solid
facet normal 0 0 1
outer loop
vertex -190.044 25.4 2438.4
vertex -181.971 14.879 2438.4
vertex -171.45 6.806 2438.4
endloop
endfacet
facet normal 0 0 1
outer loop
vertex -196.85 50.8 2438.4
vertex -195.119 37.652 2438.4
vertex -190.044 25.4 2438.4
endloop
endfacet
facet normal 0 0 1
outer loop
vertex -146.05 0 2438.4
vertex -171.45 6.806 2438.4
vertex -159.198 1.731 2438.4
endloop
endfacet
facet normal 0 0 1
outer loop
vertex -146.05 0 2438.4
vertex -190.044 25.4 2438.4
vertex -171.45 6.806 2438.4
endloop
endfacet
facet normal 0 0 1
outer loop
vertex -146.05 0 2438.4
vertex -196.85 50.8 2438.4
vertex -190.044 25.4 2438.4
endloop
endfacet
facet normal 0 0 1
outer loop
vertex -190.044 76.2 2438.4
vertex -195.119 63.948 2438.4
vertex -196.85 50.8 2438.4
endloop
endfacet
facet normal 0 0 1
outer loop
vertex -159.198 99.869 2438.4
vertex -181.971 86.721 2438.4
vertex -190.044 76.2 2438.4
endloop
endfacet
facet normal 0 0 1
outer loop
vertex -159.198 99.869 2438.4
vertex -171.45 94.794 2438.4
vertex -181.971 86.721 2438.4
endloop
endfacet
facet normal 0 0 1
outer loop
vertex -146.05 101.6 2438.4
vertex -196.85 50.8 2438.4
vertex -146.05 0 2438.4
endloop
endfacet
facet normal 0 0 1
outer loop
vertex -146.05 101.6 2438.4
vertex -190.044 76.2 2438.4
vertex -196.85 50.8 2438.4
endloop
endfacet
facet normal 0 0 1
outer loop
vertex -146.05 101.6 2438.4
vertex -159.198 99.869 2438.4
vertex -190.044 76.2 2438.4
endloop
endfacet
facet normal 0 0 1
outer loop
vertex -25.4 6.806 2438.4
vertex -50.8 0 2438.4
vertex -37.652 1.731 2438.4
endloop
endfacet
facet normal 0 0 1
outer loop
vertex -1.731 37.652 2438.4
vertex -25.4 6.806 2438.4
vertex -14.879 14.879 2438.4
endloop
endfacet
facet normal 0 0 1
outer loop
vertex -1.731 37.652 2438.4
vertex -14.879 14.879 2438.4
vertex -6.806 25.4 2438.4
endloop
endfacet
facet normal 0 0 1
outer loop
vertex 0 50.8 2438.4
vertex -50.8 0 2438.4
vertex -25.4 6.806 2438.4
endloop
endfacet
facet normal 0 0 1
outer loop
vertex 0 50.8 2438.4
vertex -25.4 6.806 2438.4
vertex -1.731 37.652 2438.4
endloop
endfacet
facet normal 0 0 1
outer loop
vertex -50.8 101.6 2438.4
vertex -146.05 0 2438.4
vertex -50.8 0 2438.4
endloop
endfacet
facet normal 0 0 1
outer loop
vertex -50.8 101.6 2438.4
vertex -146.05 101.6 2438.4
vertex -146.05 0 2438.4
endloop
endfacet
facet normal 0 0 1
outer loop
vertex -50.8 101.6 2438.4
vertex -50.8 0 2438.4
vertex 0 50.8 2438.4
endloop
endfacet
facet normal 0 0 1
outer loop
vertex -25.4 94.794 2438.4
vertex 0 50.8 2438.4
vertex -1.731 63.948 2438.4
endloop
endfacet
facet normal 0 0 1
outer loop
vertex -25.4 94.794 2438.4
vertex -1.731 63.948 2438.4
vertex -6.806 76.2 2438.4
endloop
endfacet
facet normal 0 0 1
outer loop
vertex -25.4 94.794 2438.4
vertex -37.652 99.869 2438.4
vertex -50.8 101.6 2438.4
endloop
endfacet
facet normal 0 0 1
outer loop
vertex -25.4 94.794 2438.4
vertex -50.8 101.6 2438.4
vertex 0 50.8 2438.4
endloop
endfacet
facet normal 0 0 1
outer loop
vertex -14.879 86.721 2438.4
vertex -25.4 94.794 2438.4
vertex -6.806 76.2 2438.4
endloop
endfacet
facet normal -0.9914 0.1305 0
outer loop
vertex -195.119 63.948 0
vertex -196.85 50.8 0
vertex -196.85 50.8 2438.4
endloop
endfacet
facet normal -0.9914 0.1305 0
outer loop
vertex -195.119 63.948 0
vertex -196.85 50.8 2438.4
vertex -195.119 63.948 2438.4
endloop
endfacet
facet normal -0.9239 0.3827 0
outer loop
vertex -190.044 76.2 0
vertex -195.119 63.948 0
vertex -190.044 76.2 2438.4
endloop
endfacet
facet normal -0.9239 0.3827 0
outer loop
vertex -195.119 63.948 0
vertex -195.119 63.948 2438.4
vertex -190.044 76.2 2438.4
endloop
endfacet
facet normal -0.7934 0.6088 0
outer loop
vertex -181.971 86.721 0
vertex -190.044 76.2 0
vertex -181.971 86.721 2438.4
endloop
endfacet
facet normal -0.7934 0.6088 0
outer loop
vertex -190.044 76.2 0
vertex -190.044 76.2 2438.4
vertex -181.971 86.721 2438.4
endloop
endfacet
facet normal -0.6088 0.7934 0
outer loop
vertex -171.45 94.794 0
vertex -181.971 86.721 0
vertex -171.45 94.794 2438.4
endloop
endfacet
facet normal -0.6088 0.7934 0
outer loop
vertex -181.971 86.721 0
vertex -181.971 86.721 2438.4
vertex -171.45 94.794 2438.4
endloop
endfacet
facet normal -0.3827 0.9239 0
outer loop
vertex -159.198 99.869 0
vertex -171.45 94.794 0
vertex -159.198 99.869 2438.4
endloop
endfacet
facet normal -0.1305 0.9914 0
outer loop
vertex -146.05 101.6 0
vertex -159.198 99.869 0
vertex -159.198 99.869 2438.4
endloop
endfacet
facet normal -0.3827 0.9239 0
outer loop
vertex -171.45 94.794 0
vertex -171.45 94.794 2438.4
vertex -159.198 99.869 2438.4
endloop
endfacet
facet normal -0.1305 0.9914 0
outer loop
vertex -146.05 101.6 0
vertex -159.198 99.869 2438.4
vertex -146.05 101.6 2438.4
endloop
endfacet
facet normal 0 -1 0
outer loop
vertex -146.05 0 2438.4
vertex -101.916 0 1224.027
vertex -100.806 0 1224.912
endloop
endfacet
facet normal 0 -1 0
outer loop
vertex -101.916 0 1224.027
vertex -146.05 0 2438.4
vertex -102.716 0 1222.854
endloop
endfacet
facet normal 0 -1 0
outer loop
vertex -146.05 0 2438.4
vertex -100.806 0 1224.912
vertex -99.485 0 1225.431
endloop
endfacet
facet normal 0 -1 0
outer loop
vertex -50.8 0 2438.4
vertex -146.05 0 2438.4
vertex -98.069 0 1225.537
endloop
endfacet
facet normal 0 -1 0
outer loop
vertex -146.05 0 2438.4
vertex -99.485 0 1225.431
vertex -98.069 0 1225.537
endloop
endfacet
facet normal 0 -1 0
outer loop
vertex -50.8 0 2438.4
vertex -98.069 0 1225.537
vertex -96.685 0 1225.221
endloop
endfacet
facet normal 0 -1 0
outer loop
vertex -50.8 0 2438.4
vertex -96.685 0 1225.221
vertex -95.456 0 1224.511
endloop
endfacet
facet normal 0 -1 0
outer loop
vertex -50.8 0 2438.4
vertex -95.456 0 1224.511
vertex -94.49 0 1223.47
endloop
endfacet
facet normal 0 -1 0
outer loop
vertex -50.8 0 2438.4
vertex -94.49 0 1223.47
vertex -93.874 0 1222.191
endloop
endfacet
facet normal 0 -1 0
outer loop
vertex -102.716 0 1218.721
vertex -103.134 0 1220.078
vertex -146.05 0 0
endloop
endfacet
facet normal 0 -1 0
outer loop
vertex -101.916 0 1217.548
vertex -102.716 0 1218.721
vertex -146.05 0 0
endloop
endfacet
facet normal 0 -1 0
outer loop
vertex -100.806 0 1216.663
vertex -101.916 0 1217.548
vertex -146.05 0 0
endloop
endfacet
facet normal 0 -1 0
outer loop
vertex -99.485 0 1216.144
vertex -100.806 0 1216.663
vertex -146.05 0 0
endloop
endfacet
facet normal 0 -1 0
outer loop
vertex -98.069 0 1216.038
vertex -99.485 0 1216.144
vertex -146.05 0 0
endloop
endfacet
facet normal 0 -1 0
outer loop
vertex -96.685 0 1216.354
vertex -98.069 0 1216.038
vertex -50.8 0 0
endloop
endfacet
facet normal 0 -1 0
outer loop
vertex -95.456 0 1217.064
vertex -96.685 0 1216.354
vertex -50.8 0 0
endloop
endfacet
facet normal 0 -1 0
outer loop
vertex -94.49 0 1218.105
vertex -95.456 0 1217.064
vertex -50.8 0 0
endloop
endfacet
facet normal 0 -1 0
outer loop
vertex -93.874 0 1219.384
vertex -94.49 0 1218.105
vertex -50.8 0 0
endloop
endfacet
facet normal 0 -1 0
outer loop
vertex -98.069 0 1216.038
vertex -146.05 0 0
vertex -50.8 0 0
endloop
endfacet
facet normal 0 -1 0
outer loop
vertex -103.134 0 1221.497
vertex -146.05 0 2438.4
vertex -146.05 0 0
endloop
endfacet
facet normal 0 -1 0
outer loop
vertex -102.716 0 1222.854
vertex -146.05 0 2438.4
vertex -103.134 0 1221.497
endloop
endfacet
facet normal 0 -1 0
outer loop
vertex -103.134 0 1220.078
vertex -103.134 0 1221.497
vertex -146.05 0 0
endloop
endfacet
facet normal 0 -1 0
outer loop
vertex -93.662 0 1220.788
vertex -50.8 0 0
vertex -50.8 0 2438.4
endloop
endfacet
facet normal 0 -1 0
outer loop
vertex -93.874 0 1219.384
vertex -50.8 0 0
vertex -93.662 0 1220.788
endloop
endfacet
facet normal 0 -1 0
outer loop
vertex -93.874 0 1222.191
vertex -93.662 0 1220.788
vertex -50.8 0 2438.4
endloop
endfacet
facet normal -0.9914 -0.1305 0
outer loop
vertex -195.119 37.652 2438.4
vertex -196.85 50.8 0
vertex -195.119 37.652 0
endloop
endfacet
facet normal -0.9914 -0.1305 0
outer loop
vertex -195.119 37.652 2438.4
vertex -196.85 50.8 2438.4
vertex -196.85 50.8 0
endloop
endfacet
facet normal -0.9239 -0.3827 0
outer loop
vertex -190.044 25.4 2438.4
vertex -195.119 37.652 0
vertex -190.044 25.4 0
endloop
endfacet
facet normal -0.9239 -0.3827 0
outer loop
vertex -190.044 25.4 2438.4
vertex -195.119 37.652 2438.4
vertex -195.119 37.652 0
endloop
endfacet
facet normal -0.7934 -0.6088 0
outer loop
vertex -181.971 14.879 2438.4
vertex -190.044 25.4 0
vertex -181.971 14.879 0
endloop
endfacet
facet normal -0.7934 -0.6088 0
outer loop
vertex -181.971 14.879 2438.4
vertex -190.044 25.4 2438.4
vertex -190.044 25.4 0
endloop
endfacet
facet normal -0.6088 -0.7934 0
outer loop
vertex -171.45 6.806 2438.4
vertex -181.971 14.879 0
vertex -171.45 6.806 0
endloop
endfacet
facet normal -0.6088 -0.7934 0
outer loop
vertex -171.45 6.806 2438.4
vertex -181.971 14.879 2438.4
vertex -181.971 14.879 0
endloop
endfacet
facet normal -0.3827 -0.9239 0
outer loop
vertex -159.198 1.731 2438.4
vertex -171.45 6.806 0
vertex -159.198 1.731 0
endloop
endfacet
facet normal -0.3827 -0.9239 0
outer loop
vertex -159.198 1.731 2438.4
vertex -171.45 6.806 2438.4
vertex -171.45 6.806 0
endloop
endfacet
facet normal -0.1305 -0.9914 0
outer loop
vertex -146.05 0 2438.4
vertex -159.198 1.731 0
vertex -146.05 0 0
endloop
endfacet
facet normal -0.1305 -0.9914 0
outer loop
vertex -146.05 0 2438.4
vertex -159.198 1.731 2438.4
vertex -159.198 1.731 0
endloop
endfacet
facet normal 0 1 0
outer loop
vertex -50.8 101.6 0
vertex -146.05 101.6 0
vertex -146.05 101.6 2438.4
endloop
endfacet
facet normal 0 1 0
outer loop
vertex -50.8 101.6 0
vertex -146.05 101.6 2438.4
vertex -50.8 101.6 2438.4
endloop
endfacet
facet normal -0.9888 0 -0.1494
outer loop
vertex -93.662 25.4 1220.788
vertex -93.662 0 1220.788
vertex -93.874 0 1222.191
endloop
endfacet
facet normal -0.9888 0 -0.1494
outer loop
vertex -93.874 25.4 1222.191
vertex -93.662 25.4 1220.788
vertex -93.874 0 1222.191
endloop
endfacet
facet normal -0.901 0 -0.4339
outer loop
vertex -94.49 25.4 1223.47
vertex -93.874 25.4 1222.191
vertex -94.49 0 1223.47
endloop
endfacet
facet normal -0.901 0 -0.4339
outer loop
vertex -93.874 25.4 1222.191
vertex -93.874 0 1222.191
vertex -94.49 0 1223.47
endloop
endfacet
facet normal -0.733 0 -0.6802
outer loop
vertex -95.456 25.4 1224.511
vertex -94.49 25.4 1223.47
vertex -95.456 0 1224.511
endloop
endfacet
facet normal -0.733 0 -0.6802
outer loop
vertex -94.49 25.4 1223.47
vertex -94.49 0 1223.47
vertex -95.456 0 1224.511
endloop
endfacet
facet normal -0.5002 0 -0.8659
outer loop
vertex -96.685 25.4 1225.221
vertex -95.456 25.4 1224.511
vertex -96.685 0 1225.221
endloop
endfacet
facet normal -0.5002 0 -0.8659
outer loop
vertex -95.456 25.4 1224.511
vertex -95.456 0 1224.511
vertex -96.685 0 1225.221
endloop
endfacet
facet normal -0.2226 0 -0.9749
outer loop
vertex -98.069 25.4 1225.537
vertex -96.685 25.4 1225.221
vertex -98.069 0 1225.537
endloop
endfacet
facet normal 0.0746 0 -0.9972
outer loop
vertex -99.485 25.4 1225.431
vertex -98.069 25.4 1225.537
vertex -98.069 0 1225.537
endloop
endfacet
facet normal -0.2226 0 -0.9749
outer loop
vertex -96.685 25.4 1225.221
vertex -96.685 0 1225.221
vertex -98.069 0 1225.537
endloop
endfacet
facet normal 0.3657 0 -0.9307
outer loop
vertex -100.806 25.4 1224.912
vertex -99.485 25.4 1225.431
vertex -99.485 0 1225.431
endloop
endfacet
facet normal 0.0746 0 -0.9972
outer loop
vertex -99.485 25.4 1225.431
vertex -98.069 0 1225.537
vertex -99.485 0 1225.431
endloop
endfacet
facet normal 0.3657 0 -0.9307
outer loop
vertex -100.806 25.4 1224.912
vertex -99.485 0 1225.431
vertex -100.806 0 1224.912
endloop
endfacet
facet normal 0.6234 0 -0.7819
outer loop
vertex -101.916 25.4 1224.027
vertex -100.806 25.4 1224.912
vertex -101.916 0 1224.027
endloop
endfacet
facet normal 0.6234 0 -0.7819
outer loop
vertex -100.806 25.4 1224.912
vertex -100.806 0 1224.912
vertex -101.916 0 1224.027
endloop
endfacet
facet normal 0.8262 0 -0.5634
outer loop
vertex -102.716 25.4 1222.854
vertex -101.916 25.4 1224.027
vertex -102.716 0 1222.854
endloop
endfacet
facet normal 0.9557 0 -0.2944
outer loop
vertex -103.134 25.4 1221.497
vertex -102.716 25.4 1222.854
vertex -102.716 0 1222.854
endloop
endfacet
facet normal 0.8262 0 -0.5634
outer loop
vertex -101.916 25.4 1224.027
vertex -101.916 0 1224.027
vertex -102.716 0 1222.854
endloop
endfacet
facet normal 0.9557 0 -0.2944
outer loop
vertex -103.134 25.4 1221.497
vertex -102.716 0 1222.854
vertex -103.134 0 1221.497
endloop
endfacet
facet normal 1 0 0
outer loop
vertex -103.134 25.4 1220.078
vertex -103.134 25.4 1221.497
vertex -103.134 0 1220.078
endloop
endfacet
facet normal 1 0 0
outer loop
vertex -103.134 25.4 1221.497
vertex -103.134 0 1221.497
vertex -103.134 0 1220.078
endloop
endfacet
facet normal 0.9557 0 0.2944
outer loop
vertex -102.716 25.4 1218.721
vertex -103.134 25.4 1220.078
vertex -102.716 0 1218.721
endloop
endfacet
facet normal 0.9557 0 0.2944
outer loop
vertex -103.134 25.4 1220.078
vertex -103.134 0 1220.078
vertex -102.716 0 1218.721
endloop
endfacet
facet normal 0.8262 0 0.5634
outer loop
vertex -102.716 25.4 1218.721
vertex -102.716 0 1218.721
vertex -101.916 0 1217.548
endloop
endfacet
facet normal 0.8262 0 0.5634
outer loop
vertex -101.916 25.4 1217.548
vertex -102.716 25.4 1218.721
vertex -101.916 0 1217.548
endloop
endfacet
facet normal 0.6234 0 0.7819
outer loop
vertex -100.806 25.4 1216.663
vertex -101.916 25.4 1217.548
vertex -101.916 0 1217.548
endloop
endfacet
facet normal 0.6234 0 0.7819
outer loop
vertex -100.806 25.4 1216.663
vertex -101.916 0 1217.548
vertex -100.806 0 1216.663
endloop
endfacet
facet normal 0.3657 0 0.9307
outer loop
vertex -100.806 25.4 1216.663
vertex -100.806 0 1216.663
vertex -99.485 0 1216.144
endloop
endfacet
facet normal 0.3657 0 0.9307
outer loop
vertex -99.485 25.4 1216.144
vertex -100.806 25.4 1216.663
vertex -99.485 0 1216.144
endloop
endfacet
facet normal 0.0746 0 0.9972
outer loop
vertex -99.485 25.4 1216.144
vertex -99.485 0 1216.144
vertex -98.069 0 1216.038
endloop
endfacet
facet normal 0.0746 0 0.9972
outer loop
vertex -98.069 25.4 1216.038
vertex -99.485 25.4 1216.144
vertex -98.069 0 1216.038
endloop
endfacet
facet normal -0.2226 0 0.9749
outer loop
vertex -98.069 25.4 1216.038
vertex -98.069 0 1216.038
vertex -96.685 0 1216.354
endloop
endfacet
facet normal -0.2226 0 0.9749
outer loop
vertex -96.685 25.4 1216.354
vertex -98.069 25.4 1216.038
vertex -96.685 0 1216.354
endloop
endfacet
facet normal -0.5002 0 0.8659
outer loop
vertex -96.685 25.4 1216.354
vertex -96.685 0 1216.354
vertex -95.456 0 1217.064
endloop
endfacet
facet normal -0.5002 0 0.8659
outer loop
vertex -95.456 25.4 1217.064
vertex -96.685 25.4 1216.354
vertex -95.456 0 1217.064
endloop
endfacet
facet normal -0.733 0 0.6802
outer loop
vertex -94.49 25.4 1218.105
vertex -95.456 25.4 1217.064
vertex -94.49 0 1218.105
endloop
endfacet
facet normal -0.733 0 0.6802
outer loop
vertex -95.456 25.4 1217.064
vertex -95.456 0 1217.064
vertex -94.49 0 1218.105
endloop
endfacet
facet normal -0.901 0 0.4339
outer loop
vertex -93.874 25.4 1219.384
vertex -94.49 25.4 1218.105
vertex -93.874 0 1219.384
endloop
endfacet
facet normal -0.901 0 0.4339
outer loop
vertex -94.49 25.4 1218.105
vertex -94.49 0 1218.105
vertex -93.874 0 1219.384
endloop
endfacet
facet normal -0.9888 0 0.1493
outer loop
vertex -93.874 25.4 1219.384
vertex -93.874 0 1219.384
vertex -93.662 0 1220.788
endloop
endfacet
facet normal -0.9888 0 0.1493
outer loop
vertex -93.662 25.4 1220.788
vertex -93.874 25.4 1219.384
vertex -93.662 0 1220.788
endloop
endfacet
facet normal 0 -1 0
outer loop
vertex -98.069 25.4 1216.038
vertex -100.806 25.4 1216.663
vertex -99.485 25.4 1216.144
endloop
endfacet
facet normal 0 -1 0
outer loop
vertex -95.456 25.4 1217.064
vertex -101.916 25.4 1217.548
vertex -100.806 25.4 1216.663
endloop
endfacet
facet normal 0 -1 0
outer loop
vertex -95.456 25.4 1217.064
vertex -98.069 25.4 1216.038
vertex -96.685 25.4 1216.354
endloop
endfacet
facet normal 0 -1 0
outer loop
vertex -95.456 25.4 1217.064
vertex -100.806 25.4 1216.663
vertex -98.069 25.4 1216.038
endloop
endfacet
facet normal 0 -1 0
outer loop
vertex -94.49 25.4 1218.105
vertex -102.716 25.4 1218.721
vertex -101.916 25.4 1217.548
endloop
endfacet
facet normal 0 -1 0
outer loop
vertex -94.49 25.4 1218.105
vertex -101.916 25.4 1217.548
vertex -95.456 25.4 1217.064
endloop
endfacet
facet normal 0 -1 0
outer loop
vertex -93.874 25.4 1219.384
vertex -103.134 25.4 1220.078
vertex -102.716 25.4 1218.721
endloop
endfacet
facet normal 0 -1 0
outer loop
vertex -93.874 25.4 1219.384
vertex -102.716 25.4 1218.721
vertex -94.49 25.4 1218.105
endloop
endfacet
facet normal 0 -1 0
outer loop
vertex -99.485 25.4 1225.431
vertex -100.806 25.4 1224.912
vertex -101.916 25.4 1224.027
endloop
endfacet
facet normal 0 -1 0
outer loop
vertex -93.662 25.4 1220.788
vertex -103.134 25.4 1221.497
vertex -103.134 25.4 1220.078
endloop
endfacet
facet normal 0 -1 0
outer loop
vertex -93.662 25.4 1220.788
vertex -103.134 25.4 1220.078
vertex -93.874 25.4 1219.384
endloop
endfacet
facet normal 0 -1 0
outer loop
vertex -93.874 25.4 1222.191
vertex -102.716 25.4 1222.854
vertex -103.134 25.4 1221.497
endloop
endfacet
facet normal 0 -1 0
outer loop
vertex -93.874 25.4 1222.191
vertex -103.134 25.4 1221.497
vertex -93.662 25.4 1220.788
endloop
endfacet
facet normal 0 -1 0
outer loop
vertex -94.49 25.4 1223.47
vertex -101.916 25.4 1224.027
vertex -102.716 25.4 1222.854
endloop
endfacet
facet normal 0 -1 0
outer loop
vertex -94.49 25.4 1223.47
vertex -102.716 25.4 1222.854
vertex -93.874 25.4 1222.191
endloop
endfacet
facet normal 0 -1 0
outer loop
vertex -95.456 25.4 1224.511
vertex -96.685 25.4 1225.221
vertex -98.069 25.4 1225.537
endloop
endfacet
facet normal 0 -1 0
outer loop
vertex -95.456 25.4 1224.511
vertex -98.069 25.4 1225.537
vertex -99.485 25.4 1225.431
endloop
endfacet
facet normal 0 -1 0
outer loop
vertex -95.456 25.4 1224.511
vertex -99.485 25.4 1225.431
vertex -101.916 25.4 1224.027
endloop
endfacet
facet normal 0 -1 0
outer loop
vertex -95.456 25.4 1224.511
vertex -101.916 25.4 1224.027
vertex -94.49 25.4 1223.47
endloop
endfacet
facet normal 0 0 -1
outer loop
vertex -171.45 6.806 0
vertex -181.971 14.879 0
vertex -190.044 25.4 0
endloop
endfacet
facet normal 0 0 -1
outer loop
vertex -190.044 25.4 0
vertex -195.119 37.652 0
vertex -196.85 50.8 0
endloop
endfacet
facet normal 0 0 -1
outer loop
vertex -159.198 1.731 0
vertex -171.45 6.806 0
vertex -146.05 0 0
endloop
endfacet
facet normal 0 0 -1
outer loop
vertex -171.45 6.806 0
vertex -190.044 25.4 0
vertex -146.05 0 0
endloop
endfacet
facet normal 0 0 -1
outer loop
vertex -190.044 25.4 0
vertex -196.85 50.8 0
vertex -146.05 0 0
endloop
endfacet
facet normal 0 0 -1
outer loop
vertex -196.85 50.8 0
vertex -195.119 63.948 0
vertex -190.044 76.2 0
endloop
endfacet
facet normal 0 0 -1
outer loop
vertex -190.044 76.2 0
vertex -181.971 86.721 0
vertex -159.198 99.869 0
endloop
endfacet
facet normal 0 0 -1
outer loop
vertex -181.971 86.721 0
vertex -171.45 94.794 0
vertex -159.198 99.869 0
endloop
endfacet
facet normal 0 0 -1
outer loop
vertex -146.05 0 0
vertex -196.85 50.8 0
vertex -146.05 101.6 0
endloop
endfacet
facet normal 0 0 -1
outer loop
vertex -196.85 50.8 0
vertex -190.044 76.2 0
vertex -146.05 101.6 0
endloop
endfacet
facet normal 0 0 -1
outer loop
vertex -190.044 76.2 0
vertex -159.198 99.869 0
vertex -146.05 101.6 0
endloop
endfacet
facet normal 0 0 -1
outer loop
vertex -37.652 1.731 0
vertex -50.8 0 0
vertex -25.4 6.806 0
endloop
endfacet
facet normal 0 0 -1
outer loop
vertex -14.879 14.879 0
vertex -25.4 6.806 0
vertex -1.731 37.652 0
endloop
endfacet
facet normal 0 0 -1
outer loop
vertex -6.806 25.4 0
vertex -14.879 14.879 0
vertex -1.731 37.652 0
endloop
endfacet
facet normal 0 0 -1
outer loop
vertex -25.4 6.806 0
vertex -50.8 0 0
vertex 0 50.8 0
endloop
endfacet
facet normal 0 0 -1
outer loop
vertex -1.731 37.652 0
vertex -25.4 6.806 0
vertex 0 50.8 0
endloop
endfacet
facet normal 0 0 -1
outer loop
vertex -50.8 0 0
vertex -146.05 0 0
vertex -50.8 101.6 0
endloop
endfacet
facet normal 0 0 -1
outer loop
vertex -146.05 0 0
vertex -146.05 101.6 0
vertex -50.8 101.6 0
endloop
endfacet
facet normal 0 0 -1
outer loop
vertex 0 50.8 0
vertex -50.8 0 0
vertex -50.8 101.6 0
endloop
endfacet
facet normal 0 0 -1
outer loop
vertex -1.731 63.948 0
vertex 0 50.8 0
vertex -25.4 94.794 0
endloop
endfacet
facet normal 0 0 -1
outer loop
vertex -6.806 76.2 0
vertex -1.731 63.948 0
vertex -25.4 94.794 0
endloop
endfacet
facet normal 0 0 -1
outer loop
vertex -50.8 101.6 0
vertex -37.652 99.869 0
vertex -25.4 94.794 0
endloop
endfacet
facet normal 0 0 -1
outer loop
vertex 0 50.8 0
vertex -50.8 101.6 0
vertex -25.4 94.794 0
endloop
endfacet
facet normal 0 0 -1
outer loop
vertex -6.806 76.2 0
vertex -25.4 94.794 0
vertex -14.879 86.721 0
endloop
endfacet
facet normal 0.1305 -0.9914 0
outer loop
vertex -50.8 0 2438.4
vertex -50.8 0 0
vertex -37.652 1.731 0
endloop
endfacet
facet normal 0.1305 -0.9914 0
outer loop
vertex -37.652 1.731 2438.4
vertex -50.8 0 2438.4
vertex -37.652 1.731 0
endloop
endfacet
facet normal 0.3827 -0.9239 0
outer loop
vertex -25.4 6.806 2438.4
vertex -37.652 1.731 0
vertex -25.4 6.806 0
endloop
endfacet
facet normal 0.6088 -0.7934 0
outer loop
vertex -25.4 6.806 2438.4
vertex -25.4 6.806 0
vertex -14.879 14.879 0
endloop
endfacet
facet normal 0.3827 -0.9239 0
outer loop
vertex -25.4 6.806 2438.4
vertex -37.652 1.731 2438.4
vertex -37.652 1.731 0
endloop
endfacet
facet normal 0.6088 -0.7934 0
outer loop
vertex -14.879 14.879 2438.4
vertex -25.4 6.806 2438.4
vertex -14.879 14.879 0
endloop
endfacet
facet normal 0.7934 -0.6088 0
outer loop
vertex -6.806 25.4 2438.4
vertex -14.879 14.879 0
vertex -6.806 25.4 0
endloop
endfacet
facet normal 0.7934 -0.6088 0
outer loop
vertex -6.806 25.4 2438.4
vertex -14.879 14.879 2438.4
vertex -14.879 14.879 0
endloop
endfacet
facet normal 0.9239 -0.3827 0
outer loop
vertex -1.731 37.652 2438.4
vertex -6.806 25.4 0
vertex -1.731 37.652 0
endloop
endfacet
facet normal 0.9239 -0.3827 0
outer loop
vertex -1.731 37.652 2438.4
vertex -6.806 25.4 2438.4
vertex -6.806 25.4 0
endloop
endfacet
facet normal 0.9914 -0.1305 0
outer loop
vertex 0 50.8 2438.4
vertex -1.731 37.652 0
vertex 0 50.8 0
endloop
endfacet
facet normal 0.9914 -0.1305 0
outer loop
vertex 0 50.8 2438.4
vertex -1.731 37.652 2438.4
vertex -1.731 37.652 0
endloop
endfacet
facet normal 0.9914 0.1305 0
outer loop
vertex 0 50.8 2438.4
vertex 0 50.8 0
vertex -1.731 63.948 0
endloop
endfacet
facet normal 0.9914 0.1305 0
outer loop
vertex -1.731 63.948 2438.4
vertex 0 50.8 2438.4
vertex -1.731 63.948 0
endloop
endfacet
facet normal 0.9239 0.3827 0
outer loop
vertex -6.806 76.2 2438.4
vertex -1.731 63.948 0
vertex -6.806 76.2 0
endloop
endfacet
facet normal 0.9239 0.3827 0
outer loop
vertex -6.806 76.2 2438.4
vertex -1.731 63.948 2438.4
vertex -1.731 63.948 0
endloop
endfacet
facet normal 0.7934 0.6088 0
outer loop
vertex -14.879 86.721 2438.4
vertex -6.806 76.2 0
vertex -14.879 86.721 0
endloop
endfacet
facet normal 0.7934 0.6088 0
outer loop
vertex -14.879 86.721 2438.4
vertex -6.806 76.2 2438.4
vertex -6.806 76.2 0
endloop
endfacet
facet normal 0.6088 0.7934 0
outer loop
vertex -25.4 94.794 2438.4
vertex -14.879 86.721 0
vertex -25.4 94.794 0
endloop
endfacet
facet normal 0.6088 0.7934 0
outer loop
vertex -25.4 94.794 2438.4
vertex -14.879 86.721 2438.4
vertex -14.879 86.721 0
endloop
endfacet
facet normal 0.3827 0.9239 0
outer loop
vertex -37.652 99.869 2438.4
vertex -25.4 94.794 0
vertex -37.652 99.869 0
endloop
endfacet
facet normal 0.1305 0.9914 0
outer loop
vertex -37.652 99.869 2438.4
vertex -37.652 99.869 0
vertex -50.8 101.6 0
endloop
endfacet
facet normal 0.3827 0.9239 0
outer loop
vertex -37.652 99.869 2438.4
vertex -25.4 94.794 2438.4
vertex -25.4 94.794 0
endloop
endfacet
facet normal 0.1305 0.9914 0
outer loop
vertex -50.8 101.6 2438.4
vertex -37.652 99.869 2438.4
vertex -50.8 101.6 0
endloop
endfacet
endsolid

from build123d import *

# Parameters (mm, degrees)
F0_W     = 196.85
F0_H     = 101.6
F1_DEPTH = 2438.4
F2_R     = 50.79999
F3_R     = 4.7625
F4_DEPTH = 25.4
F5_DEPTH = 25.4


# Not quite as in the source:
# - a fillet or chamfer is up to 0.001 mm smaller than in the source, because OpenCascade refuses the exact size


with BuildPart() as f1:
    # F0 (on Top) → F1 (new body)
    with BuildSketch(Plane.XY):
        with Locations((-98.425, 50.8)):
            Rectangle(F0_W, F0_H)
    extrude(amount=F1_DEPTH)

    # F2 (radius 50.8 in the source; OpenCascade refuses exactly that, so slightly less here)
    f2_edges = [f1.edges().sort_by_distance(p)[0] for p in [
        (0, 0, 1219.2),
        (-196.85, 0, 1219.2),
        (-196.85, 101.6, 1219.2),
        (0, 101.6, 1219.2),
    ]]
    fillet(f2_edges, radius=F2_R)

    # F3 (on face) → F4 (cut)
    with BuildSketch(Plane.XZ):
        with Locations((-98.425, 1220.7875)):
            Circle(F3_R)
    extrude(amount=-F4_DEPTH, mode=Mode.SUBTRACT)

    # F3 (on face) → F5 (cut)
    with BuildSketch(Plane.XZ):
        with Locations((-98.425, 1220.7875)):
            Circle(F3_R)
    extrude(amount=-F5_DEPTH, mode=Mode.SUBTRACT)


solid = f1.part
